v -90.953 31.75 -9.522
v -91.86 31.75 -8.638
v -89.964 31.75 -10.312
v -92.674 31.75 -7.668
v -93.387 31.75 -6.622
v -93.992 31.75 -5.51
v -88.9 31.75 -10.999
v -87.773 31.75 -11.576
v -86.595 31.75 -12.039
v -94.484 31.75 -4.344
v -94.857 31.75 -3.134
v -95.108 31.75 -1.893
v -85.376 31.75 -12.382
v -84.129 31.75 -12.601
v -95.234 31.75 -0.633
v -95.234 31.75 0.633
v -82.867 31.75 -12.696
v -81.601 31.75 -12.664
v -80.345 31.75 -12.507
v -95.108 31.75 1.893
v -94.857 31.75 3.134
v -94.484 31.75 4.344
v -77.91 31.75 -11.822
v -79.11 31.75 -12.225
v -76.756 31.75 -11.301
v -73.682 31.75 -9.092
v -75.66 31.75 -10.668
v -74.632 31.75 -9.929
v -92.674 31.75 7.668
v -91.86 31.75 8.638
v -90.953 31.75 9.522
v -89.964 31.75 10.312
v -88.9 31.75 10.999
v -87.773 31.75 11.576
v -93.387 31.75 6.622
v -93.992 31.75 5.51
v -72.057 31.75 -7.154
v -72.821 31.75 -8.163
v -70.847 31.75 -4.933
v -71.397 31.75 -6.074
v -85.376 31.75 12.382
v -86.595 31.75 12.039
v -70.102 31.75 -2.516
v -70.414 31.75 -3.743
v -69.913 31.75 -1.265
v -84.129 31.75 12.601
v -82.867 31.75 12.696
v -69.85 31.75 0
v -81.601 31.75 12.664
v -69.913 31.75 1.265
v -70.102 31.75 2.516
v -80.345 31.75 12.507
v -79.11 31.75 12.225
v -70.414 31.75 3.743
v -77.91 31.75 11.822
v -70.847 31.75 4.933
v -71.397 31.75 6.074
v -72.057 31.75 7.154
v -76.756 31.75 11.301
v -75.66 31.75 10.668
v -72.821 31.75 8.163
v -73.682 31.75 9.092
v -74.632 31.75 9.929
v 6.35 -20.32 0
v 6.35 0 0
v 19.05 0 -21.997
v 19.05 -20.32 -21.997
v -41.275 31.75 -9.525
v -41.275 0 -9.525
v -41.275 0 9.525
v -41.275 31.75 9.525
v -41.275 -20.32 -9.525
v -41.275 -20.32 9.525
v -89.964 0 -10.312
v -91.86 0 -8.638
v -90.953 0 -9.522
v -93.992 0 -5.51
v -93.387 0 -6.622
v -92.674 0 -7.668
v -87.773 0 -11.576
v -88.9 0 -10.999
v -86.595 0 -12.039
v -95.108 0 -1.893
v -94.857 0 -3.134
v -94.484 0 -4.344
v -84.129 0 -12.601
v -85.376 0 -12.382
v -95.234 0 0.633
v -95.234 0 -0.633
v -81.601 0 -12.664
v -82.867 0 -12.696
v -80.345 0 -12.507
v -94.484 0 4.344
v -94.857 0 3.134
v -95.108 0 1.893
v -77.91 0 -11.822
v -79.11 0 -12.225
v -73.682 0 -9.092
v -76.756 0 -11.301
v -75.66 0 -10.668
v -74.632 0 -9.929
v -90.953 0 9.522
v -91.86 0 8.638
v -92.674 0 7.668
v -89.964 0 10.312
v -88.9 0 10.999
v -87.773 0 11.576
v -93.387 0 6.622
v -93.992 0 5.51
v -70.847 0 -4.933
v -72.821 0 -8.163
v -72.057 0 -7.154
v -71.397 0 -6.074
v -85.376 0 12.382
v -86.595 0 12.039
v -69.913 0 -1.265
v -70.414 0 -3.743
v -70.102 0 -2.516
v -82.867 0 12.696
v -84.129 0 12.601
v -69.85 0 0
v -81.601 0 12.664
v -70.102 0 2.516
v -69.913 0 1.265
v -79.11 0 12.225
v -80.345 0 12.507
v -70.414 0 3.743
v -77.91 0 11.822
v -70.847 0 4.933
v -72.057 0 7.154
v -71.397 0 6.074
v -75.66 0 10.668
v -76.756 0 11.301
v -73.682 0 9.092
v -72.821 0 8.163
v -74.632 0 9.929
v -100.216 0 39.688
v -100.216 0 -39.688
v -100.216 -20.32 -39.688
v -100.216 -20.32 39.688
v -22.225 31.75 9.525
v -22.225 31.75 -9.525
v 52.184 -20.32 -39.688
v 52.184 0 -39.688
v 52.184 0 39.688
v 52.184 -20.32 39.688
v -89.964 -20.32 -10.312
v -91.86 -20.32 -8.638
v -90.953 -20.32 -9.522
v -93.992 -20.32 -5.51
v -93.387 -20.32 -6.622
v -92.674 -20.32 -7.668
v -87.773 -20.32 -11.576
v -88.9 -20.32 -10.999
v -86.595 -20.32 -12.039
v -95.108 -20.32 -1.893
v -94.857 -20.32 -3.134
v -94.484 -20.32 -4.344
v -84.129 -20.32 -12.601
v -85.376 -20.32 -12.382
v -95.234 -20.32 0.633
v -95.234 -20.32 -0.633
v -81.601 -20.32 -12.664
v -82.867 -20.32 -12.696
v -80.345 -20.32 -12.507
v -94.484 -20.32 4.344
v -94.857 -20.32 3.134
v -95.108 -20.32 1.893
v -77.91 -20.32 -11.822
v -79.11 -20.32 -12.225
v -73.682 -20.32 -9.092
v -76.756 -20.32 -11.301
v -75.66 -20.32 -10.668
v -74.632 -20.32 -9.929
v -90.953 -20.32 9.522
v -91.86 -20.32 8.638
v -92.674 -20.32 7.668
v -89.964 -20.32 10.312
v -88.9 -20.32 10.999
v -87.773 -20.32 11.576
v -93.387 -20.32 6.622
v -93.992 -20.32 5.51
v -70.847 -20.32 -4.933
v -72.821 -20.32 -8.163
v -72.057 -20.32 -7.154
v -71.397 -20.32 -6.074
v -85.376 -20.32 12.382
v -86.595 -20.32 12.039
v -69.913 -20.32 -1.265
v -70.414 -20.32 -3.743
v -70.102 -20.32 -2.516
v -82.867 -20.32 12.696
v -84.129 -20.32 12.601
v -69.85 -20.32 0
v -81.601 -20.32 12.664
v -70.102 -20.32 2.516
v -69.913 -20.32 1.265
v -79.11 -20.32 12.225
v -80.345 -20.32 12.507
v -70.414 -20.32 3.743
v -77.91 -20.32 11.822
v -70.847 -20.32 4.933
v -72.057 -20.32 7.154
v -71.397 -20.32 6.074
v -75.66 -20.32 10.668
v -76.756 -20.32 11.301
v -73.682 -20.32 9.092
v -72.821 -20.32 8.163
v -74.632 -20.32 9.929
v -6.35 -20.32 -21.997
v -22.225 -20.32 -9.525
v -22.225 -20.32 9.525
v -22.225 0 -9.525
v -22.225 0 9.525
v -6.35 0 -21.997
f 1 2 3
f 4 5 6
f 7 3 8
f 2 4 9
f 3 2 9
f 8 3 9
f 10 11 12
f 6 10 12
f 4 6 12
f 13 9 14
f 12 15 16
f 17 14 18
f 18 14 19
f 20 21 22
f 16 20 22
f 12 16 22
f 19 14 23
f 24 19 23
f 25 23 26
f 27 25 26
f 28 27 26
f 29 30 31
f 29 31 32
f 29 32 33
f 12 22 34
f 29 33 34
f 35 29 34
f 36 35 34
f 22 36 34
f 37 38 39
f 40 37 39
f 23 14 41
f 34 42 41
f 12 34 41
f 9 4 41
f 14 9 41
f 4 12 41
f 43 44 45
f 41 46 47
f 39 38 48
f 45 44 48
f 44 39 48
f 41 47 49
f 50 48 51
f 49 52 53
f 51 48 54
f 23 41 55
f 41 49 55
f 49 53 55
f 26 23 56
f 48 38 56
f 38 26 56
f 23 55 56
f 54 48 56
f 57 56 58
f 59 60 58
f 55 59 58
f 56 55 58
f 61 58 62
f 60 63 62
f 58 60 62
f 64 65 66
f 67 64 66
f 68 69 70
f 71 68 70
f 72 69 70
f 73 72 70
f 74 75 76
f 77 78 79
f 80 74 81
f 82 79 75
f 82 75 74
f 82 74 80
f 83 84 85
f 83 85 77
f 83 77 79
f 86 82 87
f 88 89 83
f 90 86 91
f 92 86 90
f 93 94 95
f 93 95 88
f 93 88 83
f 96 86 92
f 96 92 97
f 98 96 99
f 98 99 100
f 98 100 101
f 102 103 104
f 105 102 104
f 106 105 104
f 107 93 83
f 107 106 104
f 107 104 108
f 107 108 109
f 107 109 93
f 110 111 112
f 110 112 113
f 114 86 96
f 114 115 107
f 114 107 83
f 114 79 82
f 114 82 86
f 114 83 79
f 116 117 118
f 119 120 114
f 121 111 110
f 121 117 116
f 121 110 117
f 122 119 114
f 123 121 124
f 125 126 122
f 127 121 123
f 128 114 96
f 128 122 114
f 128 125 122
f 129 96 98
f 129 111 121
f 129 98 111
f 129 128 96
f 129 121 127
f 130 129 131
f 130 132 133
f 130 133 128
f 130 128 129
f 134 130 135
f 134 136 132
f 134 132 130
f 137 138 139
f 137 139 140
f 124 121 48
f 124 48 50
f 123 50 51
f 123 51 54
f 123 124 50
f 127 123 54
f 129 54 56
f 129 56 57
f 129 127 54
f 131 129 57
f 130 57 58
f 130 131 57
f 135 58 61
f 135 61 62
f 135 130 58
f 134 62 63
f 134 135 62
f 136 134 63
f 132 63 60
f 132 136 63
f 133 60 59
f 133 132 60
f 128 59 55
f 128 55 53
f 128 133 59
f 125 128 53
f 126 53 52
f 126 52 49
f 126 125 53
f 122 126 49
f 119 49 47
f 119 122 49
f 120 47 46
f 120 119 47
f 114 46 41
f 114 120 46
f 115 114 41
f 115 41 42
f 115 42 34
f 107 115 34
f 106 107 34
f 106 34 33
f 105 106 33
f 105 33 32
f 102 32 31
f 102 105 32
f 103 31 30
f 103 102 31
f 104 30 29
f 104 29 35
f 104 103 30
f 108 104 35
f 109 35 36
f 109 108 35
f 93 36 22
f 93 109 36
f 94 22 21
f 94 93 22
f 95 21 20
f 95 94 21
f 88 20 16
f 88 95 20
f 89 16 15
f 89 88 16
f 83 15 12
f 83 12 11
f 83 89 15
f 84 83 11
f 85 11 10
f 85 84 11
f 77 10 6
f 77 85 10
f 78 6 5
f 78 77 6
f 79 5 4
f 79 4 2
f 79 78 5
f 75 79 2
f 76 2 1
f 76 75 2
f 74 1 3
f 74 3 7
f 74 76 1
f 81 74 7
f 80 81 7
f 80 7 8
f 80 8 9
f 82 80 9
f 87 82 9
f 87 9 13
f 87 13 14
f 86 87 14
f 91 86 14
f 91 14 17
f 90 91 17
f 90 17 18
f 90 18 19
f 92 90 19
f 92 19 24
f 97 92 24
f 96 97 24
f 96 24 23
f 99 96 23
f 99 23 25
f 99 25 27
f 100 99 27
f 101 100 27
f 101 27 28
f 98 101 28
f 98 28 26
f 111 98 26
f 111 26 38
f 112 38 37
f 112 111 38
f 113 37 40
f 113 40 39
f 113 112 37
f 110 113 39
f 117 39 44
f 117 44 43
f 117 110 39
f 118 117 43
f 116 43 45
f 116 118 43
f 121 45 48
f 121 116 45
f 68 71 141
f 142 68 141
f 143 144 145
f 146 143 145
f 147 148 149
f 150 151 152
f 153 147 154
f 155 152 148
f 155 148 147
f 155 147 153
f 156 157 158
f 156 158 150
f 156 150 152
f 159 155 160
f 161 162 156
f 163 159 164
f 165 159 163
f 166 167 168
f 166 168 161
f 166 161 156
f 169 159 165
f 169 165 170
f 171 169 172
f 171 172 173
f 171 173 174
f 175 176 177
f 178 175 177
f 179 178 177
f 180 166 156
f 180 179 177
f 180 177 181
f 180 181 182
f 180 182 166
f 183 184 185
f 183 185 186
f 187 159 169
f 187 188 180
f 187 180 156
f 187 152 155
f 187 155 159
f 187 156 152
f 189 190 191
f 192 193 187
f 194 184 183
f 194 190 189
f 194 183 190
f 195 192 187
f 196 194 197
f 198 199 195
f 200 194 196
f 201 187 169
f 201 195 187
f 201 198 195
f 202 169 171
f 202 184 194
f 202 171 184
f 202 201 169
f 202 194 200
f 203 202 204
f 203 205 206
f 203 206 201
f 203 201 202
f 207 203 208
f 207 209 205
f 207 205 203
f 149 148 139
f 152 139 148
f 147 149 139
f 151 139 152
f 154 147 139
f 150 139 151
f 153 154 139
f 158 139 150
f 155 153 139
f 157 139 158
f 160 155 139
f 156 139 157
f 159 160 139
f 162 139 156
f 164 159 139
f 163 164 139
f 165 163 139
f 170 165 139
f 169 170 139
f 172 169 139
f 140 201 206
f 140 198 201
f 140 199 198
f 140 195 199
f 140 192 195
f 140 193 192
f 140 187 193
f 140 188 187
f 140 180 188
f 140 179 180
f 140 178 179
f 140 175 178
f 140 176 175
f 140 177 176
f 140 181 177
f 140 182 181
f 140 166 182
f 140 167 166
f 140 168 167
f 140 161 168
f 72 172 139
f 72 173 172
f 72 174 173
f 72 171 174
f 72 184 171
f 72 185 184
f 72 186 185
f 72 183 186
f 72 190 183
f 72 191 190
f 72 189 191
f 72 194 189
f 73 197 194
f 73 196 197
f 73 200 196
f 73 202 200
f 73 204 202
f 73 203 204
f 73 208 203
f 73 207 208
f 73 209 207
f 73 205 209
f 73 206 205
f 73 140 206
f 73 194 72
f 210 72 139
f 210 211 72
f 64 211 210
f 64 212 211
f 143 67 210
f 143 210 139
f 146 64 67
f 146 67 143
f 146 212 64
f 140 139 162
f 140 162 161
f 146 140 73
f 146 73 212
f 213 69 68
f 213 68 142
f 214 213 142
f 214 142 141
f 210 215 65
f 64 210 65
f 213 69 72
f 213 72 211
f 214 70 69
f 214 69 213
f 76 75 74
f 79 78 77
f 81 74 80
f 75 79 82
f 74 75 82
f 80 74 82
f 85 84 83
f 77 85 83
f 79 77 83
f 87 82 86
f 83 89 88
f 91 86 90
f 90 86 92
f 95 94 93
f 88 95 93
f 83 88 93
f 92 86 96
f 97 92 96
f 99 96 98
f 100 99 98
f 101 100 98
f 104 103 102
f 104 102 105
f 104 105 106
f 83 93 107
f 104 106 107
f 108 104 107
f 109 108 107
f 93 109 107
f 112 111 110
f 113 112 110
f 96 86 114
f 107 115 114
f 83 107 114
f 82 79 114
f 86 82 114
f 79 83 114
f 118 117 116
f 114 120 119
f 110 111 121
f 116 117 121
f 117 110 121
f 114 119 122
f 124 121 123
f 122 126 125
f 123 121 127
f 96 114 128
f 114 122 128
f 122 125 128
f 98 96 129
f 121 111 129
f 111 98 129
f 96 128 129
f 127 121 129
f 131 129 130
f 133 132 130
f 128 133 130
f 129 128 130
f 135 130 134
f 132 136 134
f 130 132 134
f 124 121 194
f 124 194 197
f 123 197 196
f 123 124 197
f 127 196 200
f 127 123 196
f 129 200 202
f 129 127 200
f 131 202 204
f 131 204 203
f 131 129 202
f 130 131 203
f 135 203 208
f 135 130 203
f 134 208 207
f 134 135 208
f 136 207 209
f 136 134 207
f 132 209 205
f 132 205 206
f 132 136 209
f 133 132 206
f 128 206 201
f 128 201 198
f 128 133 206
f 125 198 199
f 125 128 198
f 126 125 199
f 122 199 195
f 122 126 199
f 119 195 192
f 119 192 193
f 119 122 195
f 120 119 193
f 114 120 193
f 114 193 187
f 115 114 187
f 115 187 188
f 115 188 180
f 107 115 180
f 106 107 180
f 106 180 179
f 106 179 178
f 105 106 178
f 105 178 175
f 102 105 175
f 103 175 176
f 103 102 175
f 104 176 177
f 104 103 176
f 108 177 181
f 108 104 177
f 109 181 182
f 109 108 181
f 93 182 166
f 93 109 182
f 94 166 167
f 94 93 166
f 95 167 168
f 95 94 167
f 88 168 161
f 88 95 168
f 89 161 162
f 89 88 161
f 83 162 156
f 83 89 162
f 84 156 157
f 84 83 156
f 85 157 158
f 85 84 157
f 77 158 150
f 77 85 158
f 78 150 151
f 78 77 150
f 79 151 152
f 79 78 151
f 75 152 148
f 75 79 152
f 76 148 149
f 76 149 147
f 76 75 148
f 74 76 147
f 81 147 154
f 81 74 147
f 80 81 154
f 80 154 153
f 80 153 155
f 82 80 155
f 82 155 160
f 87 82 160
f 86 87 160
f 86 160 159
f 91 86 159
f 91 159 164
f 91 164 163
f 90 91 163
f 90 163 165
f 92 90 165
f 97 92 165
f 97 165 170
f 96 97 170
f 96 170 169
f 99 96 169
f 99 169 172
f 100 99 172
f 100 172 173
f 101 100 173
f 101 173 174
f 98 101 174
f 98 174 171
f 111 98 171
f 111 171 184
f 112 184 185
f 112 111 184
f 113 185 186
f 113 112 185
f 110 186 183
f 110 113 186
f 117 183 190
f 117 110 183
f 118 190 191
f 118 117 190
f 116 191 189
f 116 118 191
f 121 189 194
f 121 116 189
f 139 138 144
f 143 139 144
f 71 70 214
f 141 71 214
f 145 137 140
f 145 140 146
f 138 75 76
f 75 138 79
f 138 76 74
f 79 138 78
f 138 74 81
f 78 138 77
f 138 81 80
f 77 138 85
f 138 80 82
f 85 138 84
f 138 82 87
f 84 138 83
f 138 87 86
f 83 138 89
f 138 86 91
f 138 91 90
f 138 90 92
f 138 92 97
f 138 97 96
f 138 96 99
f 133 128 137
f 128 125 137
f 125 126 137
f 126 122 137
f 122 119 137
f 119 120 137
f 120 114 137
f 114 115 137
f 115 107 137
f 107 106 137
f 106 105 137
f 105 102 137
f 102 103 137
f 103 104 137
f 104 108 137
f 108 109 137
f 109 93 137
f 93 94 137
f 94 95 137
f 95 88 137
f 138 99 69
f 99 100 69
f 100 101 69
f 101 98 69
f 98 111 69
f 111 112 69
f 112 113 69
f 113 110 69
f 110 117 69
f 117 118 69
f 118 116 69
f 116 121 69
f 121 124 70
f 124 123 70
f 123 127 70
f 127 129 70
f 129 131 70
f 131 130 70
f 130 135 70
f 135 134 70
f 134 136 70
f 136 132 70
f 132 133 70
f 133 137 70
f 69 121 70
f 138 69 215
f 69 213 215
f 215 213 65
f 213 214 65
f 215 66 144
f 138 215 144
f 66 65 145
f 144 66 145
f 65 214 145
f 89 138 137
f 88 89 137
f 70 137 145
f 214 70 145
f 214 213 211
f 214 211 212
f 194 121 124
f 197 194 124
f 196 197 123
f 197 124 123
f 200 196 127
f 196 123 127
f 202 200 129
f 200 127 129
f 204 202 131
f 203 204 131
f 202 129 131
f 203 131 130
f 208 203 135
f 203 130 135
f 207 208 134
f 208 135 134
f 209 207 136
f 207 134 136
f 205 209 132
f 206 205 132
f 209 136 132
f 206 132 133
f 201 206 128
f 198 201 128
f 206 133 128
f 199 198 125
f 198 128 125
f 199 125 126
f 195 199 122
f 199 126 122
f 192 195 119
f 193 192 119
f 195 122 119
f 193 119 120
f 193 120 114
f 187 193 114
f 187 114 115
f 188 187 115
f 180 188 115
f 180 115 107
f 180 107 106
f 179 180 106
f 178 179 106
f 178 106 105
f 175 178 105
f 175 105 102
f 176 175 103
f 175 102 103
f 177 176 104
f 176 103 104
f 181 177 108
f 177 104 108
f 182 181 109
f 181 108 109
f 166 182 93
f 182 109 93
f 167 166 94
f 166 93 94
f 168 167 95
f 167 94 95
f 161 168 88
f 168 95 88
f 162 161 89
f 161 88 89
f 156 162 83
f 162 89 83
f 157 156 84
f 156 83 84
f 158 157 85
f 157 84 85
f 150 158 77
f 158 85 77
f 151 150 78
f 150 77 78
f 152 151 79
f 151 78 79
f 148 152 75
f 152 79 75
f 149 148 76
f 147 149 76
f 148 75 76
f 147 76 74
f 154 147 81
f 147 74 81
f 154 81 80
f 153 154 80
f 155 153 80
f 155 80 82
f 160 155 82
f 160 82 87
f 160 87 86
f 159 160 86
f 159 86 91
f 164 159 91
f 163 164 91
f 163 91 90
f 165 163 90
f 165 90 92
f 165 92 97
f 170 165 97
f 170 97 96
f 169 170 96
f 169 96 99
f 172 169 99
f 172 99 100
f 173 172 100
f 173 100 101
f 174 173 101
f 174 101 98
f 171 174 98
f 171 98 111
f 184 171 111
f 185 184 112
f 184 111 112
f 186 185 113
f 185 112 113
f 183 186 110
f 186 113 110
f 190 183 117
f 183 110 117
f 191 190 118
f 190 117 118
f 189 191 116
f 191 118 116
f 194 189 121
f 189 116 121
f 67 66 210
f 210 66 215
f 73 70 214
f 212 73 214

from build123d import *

# Parameters (mm, degrees)
F0_W     = 152.4
F0_H     = 79.375
F0_R     = 12.7
F0_W_2   = 19.05
F0_H_2   = 19.05
F1_DEPTH = 20.32
F2_DEPTH = 31.75
F3_DEPTH = 31.75
F4_DEPTH = 20.32


with BuildPart() as f1:
    # F0 (on Front) → F1 (new body)
    with BuildSketch(Plane.XZ):
        with Locations((-24.0162322402, 0)):
            Rectangle(F0_W, F0_H)
        Polygon((-6.35, -21.9970452561), (6.35, 0), (19.05, -21.9970452561), align=None, mode=Mode.SUBTRACT)
        with Locations((-82.55, 0)):
            Circle(F0_R, mode=Mode.SUBTRACT)
        with Locations((-31.75, 0)):
            Rectangle(F0_W_2, F0_H_2, mode=Mode.SUBTRACT)
    extrude(amount=F1_DEPTH)

    # F0 (on Front) → F2 (join)
    with BuildSketch(Plane.XZ):
        with Locations((-31.75, 0)):
            Rectangle(F0_W_2, F0_H_2)
    extrude(amount=-F2_DEPTH)

    # F0 (on Front) → F3 (join)
    with BuildSketch(Plane.XZ):
        with Locations((-82.55, 0)):
            Circle(F0_R)
    extrude(amount=-F3_DEPTH)


with BuildPart() as f4:
    # F4 (new): a face of the model
    f4_faces = [f1.part.faces().sort_by_distance(p)[0] for p in [
        (-82.55, 0, 0),
    ]]
    extrude(f4_faces, amount=F4_DEPTH)


solid = Compound([f1.part, f4.part])
